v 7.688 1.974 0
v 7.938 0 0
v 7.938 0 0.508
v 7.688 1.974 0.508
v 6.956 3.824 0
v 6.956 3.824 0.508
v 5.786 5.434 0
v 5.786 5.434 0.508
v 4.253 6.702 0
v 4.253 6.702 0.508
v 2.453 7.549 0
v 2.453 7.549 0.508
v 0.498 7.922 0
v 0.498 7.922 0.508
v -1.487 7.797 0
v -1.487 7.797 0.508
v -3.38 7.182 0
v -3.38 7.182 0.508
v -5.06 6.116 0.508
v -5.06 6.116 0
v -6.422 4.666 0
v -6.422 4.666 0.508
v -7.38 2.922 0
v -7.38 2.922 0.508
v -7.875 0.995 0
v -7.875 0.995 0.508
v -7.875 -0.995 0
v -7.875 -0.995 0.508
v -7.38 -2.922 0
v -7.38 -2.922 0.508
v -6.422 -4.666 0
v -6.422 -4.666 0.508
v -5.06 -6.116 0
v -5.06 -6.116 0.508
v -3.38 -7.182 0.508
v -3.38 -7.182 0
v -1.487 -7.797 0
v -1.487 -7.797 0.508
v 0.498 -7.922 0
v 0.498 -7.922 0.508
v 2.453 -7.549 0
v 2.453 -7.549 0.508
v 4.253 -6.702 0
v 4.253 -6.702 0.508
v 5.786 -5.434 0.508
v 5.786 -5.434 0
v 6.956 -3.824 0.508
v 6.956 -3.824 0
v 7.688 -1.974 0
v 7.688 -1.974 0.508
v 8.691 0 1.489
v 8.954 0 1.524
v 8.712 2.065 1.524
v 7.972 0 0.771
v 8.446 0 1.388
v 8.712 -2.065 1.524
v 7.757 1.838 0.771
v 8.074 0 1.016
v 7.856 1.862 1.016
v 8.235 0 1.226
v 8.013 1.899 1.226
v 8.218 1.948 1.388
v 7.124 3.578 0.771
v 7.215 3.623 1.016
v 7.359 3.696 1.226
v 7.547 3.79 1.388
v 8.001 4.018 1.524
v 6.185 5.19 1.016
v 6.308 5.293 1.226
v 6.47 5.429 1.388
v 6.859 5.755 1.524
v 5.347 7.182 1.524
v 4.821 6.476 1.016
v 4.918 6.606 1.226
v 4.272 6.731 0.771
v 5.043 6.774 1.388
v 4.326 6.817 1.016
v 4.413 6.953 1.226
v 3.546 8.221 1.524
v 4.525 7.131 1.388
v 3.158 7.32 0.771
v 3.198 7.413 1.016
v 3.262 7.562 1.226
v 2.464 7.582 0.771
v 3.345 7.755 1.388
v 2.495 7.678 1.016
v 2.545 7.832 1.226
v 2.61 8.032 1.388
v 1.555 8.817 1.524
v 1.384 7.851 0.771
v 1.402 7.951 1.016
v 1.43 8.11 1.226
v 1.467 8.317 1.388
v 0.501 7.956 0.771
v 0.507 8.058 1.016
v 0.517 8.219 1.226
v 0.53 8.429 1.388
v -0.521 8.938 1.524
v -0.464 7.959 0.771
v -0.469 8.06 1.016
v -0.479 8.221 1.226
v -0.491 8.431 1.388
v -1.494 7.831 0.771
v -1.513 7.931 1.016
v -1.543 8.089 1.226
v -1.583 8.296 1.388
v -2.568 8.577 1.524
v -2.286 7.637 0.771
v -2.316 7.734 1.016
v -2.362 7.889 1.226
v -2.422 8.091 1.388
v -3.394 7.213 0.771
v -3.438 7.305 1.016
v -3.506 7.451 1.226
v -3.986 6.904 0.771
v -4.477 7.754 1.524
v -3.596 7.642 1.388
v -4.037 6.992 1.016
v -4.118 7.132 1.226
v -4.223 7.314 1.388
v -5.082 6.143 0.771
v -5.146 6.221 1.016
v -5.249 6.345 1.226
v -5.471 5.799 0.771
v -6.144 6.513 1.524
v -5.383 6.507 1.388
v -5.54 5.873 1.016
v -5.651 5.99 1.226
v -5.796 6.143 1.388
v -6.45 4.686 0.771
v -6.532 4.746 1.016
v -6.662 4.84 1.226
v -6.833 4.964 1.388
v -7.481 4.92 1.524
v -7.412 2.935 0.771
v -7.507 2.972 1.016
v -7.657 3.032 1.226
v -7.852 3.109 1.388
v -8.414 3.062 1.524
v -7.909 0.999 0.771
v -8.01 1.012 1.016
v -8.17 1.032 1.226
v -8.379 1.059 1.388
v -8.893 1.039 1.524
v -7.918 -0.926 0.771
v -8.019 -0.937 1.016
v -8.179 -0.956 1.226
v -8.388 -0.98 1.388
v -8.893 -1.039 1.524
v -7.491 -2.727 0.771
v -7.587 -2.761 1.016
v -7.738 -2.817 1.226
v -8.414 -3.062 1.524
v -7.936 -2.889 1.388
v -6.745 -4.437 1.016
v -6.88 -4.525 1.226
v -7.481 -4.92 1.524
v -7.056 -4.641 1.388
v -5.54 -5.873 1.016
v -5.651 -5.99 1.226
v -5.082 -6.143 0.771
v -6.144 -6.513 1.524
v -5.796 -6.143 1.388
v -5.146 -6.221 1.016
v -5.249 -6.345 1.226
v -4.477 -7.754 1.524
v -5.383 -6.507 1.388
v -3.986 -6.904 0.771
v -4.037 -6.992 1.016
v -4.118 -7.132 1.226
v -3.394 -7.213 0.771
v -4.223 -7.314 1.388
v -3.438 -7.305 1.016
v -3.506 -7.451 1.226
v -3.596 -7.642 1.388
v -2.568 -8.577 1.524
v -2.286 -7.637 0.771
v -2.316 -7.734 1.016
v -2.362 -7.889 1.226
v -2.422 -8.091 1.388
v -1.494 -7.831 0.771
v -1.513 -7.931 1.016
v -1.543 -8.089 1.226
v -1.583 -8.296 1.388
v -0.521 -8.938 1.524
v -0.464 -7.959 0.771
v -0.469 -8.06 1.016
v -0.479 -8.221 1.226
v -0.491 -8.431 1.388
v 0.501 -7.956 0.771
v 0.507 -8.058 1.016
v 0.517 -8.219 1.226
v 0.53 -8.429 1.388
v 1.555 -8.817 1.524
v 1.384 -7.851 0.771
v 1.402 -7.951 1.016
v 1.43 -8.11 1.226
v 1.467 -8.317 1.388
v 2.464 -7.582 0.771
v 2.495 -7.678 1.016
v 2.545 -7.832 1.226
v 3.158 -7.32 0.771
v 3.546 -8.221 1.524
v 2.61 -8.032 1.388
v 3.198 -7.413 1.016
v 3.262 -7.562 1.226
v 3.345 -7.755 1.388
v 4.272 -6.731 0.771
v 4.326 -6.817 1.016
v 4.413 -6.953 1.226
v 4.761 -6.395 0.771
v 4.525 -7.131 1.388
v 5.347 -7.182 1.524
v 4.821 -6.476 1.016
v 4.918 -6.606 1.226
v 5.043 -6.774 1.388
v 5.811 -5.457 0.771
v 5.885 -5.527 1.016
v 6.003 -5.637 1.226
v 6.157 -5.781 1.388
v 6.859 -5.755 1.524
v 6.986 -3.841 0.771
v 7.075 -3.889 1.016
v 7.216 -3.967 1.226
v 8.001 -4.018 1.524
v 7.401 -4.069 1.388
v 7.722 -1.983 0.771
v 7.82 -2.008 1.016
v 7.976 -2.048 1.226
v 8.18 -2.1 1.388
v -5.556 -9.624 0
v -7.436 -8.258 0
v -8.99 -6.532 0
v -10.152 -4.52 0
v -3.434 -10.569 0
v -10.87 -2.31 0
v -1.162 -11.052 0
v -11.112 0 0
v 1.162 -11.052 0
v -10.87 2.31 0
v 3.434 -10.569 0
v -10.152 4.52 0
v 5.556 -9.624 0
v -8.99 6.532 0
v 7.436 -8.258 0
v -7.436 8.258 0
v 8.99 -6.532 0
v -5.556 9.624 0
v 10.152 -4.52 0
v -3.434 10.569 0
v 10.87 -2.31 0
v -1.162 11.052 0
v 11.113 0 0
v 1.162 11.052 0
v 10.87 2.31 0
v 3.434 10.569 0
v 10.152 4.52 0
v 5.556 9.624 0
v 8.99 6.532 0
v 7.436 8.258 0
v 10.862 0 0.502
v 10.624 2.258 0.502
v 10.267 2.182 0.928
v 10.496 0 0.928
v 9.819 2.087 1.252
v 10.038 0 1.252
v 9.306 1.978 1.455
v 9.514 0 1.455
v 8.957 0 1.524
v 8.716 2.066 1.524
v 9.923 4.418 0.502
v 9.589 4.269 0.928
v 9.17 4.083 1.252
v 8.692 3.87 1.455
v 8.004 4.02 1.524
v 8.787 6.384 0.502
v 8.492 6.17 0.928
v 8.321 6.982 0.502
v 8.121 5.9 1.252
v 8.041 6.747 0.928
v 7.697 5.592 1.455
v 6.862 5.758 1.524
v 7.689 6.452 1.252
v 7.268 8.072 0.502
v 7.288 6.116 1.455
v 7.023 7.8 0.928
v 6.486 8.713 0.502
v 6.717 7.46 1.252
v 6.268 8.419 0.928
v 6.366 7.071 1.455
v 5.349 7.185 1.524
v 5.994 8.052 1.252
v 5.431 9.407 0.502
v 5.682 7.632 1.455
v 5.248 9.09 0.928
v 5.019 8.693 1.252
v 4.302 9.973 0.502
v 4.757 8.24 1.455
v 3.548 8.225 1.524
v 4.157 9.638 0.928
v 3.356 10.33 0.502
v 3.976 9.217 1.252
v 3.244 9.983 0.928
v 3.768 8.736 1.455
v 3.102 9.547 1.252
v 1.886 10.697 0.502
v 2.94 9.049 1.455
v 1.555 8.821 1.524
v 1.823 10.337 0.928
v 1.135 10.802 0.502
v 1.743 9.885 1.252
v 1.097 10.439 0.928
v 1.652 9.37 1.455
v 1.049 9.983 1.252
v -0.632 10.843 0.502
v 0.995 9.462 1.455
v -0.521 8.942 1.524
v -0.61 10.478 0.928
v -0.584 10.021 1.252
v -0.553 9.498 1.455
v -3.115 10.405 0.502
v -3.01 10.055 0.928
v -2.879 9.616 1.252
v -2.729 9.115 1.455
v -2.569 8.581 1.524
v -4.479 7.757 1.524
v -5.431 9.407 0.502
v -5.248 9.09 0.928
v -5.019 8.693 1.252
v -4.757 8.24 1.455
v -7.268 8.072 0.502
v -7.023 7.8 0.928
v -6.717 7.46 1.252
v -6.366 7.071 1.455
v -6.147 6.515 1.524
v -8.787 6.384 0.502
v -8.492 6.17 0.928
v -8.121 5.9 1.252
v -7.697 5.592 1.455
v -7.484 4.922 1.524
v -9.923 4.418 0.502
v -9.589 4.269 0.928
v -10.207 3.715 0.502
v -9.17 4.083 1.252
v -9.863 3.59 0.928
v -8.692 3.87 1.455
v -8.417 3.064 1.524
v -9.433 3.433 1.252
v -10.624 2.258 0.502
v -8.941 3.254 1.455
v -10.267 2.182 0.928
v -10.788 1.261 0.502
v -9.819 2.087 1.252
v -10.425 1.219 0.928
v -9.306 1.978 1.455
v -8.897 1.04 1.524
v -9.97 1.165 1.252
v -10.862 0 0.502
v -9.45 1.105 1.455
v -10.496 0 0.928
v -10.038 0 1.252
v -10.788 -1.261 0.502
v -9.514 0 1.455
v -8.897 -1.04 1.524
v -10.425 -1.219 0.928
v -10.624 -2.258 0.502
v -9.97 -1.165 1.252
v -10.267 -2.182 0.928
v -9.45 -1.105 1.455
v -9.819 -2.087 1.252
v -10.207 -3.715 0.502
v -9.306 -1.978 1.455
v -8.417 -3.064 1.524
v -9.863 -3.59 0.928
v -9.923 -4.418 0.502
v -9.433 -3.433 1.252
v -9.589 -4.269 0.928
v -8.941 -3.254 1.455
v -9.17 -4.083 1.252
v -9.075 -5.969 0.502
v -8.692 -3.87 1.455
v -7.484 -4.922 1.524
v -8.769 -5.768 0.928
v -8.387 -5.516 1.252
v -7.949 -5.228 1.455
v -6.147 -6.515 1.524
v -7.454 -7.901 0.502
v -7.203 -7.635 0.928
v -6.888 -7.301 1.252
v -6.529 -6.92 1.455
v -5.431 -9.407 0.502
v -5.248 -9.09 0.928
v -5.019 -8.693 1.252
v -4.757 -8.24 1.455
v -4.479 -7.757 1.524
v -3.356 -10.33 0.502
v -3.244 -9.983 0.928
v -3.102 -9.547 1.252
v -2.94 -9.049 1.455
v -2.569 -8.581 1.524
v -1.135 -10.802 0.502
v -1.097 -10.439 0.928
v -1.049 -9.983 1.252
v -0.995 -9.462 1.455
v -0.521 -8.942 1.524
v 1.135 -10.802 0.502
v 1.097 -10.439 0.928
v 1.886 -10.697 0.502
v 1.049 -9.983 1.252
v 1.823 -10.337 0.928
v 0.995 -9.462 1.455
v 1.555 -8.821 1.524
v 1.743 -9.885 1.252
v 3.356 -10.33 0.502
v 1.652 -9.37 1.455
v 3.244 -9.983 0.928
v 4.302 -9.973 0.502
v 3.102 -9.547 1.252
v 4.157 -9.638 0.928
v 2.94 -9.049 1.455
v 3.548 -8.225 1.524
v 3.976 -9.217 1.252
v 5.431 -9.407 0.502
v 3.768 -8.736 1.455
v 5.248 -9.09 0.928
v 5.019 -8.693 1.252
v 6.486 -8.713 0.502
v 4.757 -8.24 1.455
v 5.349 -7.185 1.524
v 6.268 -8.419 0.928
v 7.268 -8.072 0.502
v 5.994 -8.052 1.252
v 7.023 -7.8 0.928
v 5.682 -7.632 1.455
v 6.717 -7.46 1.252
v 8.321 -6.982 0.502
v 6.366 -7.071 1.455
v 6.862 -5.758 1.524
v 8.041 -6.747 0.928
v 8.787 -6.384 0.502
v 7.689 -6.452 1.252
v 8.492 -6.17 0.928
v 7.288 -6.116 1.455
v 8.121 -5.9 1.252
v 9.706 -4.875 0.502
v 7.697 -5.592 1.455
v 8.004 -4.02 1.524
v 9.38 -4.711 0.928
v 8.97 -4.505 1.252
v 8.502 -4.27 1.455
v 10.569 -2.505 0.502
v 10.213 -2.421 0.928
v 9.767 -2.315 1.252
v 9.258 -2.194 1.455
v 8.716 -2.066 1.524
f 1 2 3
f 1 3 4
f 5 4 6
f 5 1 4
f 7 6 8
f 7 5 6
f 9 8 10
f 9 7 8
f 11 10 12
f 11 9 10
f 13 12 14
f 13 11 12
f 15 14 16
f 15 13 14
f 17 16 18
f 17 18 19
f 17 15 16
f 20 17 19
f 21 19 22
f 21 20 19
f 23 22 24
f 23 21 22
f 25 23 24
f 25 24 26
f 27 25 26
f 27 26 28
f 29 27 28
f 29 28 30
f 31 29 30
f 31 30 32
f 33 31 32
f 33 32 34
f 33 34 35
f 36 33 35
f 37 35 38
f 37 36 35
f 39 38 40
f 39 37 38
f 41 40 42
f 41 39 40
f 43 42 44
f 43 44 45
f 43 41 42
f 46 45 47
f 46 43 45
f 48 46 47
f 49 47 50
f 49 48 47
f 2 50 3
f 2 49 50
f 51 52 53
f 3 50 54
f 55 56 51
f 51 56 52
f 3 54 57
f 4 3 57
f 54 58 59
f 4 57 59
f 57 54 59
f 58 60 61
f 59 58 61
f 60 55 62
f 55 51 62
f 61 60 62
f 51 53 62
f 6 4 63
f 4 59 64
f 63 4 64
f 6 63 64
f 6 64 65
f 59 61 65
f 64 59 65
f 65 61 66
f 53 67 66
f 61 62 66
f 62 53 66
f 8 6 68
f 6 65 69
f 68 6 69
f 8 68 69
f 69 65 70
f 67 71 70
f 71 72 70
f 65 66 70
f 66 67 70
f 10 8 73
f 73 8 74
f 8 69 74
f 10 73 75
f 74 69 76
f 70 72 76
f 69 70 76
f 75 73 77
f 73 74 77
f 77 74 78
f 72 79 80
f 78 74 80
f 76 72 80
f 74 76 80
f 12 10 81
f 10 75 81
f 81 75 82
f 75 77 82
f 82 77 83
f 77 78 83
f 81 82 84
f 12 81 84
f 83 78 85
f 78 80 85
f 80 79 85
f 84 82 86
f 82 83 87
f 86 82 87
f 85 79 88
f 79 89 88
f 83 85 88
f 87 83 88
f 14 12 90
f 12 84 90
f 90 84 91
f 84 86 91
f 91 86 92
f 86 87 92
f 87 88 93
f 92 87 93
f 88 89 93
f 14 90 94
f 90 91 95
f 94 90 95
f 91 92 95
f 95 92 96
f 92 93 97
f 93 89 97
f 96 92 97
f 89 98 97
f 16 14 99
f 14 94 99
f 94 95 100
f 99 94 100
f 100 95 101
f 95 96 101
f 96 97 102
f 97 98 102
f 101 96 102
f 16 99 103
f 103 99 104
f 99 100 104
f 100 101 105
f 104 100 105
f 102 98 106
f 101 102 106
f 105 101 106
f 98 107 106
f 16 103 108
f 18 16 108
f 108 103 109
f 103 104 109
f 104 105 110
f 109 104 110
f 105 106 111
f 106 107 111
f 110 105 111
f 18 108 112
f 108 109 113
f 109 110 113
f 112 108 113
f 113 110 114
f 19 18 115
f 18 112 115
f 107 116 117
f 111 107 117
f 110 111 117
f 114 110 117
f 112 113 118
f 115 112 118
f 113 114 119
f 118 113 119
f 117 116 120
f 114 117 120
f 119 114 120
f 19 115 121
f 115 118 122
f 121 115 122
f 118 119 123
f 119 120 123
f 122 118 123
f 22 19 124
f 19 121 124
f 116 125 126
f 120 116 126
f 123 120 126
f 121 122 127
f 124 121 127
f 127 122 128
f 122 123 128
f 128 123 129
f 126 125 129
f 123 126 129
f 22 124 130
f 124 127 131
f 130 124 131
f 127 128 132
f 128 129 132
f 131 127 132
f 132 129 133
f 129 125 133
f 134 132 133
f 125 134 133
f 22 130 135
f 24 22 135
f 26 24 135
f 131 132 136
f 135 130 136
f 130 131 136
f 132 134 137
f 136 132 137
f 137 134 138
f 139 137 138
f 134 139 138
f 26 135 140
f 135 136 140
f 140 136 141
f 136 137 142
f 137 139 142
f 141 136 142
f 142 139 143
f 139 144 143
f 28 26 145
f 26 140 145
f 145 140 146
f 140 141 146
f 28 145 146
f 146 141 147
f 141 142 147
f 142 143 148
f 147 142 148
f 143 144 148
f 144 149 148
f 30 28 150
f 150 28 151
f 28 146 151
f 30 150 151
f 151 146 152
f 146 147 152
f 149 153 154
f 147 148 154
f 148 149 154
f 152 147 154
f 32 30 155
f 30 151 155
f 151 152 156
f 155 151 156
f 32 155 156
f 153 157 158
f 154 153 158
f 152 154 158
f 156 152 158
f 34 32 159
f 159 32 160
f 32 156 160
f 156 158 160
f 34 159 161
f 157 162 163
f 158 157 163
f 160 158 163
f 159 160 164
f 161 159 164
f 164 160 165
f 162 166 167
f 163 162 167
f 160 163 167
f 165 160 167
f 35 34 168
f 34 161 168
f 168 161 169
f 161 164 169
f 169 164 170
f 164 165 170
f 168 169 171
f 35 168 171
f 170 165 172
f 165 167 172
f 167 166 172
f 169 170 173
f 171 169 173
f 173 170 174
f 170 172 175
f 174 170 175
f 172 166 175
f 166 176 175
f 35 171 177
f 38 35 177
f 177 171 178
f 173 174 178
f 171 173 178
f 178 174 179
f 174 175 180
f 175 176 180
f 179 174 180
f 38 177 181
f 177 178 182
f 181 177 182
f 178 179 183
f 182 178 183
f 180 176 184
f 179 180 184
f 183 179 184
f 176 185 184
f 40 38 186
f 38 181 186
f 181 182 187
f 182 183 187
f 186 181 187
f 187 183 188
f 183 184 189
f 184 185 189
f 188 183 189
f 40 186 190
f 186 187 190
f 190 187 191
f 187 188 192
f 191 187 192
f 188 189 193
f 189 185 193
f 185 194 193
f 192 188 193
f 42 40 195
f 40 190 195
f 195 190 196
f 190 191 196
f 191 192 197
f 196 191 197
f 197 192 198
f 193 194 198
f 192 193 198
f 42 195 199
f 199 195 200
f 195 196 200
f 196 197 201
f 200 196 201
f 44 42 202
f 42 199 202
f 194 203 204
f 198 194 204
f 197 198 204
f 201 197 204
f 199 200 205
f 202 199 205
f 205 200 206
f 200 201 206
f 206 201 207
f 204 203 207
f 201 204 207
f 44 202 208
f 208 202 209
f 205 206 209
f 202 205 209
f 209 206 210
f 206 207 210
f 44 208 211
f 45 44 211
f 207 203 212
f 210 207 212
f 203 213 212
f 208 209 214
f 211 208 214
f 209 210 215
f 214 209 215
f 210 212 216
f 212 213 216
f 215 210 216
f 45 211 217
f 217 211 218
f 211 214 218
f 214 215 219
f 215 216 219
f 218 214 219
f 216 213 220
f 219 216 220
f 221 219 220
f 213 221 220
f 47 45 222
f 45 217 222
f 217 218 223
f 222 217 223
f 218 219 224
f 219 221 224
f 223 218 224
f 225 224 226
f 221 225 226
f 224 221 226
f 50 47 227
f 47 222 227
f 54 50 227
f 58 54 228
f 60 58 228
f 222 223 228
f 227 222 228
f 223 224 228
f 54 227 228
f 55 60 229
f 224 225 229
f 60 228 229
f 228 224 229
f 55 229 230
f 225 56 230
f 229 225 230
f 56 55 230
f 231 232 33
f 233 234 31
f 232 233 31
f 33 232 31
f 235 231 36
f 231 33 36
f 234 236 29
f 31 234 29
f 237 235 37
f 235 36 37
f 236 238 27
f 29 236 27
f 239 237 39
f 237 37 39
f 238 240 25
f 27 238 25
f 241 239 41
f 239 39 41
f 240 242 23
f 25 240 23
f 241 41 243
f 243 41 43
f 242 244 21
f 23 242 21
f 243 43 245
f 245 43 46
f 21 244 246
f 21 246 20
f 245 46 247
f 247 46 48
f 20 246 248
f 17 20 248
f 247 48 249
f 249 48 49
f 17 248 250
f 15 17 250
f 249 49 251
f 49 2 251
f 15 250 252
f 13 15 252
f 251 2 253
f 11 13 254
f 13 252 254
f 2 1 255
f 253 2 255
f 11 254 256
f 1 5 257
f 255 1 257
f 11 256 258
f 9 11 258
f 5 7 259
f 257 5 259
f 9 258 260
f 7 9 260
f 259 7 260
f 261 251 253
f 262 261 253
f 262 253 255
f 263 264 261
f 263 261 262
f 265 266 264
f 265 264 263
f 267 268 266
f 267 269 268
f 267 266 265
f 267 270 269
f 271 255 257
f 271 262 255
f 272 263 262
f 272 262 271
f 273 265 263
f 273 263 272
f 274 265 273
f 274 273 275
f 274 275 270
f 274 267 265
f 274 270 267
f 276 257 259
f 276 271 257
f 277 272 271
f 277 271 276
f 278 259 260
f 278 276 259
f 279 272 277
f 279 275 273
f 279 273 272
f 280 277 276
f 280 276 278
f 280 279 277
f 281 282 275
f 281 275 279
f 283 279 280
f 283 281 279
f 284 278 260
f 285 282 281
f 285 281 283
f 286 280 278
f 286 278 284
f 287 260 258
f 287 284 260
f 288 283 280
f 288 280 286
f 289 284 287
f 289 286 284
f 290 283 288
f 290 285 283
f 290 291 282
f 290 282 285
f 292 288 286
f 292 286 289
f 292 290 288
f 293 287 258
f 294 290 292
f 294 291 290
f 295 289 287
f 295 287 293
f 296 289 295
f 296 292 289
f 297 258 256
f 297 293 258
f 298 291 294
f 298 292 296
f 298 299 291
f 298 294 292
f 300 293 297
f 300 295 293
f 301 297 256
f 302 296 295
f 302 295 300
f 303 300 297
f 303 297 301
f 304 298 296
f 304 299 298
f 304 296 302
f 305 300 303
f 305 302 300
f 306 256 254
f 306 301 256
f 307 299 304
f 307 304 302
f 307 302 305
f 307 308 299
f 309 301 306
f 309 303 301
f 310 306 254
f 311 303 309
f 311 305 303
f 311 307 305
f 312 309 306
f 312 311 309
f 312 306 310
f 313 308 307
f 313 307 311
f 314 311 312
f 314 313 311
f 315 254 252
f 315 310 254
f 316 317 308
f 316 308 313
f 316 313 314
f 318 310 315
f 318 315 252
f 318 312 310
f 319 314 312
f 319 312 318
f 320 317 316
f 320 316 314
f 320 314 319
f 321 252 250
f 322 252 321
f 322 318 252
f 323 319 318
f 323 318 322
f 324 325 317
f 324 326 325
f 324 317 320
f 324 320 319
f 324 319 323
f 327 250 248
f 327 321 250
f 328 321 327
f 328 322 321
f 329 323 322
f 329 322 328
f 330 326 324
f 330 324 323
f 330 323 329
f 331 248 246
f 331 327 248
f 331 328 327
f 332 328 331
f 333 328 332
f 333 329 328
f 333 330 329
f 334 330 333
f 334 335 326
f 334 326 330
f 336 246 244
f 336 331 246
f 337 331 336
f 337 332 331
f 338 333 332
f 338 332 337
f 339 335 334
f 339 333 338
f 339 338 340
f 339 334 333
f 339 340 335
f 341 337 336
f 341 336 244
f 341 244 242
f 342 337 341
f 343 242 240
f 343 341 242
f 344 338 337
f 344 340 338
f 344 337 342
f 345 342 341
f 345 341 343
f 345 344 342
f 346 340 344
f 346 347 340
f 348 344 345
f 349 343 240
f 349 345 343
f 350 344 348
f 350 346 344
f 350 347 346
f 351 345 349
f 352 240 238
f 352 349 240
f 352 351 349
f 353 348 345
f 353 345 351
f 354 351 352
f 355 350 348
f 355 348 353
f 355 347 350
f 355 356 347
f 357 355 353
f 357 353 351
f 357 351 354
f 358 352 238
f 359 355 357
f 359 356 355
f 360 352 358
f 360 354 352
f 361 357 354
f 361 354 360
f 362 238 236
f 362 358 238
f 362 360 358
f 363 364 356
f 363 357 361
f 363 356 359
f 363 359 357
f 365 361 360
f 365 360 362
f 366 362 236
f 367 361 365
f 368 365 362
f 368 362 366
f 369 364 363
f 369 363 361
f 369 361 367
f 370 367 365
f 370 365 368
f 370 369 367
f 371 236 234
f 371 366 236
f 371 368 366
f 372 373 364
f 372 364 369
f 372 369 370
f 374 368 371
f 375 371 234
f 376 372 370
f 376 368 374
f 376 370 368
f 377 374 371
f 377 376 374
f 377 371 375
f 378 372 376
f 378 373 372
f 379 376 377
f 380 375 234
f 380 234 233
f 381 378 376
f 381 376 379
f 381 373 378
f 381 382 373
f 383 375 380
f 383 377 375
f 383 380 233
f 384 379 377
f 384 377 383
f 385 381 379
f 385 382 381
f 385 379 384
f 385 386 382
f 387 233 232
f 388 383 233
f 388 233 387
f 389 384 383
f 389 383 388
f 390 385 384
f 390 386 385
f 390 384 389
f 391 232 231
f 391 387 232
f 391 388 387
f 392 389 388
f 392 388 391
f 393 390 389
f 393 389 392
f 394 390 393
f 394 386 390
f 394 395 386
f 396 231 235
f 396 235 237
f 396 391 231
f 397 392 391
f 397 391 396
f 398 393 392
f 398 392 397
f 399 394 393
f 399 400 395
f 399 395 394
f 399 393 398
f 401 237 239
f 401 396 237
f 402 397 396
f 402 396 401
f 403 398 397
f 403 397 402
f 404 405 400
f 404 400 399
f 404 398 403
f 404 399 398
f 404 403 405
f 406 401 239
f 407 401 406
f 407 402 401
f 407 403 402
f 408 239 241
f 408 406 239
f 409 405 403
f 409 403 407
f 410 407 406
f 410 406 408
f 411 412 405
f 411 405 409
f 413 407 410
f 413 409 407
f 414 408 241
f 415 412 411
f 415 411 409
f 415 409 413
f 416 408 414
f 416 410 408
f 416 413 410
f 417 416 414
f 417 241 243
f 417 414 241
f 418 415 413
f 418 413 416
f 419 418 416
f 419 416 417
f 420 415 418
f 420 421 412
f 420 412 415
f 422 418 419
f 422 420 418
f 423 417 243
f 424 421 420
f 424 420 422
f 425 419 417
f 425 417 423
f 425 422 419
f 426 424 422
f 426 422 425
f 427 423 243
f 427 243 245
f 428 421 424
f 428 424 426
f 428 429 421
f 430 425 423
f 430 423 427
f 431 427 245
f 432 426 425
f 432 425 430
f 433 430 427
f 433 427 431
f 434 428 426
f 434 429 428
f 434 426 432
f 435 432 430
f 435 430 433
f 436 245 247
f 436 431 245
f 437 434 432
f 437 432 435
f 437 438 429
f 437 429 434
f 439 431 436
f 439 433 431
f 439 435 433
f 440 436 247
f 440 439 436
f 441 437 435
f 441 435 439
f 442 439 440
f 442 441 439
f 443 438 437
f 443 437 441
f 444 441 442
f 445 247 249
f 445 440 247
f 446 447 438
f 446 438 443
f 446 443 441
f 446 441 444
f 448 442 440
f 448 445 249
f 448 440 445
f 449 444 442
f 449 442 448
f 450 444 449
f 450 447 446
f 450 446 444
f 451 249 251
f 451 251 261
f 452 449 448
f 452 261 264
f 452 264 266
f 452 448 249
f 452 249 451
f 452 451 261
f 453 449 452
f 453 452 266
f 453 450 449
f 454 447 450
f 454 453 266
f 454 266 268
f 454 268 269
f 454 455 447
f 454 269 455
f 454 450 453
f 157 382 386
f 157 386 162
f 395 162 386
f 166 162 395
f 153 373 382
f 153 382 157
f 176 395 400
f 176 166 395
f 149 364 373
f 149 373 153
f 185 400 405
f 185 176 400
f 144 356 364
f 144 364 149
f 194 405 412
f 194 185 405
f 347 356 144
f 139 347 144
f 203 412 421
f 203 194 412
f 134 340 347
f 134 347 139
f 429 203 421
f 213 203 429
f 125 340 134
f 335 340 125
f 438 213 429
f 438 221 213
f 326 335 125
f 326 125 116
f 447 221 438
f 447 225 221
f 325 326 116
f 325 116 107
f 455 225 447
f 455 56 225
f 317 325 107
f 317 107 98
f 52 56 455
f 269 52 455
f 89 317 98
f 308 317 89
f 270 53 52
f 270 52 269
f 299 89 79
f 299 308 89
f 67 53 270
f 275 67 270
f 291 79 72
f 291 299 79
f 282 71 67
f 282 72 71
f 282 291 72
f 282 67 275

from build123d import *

# Parameters (mm, degrees)
F0_R     = 11.1125
F0_R_2   = 7.9375
F1_DEPTH = 1.524
F3_R     = 1.016


# Not quite as in the source:
# - a fillet or chamfer that OpenCascade refuses, or shapes differently, is made with other operations: its cross-section is extruded or revolved along the edge and cut away or added


with BuildPart() as f1:
    # F0 (on Top) → F1 (new body)
    with BuildSketch(Plane.XY):
        Circle(F0_R)
        Circle(F0_R_2, mode=Mode.SUBTRACT)
    extrude(amount=F1_DEPTH)

    # F2: fillet of radius 2.286 on 1 edges, made by hand

    # F2_s1 → F2_t2 (revolve, cut)
    with BuildSketch(Plane.XZ):
        with BuildLine():
            ThreePointArc((11.1125, 0), (10.2770612463, 1.104511184), (8.9572385309, 1.524))
            Line((8.9572385309, 1.524), (11.1125, 1.524))
            Line((11.1125, 1.524), (11.1125, 0))
        make_face()
    revolve(axis=Axis((0, 0, 1.524), (0, 0, 1)), mode=Mode.SUBTRACT)

    # F3
    f3_edges = [f1.edges().sort_by_distance(p)[0] for p in [
        (-7.9375, 0, 1.524),
    ]]
    fillet(f3_edges, radius=F3_R)


solid = f1.part
